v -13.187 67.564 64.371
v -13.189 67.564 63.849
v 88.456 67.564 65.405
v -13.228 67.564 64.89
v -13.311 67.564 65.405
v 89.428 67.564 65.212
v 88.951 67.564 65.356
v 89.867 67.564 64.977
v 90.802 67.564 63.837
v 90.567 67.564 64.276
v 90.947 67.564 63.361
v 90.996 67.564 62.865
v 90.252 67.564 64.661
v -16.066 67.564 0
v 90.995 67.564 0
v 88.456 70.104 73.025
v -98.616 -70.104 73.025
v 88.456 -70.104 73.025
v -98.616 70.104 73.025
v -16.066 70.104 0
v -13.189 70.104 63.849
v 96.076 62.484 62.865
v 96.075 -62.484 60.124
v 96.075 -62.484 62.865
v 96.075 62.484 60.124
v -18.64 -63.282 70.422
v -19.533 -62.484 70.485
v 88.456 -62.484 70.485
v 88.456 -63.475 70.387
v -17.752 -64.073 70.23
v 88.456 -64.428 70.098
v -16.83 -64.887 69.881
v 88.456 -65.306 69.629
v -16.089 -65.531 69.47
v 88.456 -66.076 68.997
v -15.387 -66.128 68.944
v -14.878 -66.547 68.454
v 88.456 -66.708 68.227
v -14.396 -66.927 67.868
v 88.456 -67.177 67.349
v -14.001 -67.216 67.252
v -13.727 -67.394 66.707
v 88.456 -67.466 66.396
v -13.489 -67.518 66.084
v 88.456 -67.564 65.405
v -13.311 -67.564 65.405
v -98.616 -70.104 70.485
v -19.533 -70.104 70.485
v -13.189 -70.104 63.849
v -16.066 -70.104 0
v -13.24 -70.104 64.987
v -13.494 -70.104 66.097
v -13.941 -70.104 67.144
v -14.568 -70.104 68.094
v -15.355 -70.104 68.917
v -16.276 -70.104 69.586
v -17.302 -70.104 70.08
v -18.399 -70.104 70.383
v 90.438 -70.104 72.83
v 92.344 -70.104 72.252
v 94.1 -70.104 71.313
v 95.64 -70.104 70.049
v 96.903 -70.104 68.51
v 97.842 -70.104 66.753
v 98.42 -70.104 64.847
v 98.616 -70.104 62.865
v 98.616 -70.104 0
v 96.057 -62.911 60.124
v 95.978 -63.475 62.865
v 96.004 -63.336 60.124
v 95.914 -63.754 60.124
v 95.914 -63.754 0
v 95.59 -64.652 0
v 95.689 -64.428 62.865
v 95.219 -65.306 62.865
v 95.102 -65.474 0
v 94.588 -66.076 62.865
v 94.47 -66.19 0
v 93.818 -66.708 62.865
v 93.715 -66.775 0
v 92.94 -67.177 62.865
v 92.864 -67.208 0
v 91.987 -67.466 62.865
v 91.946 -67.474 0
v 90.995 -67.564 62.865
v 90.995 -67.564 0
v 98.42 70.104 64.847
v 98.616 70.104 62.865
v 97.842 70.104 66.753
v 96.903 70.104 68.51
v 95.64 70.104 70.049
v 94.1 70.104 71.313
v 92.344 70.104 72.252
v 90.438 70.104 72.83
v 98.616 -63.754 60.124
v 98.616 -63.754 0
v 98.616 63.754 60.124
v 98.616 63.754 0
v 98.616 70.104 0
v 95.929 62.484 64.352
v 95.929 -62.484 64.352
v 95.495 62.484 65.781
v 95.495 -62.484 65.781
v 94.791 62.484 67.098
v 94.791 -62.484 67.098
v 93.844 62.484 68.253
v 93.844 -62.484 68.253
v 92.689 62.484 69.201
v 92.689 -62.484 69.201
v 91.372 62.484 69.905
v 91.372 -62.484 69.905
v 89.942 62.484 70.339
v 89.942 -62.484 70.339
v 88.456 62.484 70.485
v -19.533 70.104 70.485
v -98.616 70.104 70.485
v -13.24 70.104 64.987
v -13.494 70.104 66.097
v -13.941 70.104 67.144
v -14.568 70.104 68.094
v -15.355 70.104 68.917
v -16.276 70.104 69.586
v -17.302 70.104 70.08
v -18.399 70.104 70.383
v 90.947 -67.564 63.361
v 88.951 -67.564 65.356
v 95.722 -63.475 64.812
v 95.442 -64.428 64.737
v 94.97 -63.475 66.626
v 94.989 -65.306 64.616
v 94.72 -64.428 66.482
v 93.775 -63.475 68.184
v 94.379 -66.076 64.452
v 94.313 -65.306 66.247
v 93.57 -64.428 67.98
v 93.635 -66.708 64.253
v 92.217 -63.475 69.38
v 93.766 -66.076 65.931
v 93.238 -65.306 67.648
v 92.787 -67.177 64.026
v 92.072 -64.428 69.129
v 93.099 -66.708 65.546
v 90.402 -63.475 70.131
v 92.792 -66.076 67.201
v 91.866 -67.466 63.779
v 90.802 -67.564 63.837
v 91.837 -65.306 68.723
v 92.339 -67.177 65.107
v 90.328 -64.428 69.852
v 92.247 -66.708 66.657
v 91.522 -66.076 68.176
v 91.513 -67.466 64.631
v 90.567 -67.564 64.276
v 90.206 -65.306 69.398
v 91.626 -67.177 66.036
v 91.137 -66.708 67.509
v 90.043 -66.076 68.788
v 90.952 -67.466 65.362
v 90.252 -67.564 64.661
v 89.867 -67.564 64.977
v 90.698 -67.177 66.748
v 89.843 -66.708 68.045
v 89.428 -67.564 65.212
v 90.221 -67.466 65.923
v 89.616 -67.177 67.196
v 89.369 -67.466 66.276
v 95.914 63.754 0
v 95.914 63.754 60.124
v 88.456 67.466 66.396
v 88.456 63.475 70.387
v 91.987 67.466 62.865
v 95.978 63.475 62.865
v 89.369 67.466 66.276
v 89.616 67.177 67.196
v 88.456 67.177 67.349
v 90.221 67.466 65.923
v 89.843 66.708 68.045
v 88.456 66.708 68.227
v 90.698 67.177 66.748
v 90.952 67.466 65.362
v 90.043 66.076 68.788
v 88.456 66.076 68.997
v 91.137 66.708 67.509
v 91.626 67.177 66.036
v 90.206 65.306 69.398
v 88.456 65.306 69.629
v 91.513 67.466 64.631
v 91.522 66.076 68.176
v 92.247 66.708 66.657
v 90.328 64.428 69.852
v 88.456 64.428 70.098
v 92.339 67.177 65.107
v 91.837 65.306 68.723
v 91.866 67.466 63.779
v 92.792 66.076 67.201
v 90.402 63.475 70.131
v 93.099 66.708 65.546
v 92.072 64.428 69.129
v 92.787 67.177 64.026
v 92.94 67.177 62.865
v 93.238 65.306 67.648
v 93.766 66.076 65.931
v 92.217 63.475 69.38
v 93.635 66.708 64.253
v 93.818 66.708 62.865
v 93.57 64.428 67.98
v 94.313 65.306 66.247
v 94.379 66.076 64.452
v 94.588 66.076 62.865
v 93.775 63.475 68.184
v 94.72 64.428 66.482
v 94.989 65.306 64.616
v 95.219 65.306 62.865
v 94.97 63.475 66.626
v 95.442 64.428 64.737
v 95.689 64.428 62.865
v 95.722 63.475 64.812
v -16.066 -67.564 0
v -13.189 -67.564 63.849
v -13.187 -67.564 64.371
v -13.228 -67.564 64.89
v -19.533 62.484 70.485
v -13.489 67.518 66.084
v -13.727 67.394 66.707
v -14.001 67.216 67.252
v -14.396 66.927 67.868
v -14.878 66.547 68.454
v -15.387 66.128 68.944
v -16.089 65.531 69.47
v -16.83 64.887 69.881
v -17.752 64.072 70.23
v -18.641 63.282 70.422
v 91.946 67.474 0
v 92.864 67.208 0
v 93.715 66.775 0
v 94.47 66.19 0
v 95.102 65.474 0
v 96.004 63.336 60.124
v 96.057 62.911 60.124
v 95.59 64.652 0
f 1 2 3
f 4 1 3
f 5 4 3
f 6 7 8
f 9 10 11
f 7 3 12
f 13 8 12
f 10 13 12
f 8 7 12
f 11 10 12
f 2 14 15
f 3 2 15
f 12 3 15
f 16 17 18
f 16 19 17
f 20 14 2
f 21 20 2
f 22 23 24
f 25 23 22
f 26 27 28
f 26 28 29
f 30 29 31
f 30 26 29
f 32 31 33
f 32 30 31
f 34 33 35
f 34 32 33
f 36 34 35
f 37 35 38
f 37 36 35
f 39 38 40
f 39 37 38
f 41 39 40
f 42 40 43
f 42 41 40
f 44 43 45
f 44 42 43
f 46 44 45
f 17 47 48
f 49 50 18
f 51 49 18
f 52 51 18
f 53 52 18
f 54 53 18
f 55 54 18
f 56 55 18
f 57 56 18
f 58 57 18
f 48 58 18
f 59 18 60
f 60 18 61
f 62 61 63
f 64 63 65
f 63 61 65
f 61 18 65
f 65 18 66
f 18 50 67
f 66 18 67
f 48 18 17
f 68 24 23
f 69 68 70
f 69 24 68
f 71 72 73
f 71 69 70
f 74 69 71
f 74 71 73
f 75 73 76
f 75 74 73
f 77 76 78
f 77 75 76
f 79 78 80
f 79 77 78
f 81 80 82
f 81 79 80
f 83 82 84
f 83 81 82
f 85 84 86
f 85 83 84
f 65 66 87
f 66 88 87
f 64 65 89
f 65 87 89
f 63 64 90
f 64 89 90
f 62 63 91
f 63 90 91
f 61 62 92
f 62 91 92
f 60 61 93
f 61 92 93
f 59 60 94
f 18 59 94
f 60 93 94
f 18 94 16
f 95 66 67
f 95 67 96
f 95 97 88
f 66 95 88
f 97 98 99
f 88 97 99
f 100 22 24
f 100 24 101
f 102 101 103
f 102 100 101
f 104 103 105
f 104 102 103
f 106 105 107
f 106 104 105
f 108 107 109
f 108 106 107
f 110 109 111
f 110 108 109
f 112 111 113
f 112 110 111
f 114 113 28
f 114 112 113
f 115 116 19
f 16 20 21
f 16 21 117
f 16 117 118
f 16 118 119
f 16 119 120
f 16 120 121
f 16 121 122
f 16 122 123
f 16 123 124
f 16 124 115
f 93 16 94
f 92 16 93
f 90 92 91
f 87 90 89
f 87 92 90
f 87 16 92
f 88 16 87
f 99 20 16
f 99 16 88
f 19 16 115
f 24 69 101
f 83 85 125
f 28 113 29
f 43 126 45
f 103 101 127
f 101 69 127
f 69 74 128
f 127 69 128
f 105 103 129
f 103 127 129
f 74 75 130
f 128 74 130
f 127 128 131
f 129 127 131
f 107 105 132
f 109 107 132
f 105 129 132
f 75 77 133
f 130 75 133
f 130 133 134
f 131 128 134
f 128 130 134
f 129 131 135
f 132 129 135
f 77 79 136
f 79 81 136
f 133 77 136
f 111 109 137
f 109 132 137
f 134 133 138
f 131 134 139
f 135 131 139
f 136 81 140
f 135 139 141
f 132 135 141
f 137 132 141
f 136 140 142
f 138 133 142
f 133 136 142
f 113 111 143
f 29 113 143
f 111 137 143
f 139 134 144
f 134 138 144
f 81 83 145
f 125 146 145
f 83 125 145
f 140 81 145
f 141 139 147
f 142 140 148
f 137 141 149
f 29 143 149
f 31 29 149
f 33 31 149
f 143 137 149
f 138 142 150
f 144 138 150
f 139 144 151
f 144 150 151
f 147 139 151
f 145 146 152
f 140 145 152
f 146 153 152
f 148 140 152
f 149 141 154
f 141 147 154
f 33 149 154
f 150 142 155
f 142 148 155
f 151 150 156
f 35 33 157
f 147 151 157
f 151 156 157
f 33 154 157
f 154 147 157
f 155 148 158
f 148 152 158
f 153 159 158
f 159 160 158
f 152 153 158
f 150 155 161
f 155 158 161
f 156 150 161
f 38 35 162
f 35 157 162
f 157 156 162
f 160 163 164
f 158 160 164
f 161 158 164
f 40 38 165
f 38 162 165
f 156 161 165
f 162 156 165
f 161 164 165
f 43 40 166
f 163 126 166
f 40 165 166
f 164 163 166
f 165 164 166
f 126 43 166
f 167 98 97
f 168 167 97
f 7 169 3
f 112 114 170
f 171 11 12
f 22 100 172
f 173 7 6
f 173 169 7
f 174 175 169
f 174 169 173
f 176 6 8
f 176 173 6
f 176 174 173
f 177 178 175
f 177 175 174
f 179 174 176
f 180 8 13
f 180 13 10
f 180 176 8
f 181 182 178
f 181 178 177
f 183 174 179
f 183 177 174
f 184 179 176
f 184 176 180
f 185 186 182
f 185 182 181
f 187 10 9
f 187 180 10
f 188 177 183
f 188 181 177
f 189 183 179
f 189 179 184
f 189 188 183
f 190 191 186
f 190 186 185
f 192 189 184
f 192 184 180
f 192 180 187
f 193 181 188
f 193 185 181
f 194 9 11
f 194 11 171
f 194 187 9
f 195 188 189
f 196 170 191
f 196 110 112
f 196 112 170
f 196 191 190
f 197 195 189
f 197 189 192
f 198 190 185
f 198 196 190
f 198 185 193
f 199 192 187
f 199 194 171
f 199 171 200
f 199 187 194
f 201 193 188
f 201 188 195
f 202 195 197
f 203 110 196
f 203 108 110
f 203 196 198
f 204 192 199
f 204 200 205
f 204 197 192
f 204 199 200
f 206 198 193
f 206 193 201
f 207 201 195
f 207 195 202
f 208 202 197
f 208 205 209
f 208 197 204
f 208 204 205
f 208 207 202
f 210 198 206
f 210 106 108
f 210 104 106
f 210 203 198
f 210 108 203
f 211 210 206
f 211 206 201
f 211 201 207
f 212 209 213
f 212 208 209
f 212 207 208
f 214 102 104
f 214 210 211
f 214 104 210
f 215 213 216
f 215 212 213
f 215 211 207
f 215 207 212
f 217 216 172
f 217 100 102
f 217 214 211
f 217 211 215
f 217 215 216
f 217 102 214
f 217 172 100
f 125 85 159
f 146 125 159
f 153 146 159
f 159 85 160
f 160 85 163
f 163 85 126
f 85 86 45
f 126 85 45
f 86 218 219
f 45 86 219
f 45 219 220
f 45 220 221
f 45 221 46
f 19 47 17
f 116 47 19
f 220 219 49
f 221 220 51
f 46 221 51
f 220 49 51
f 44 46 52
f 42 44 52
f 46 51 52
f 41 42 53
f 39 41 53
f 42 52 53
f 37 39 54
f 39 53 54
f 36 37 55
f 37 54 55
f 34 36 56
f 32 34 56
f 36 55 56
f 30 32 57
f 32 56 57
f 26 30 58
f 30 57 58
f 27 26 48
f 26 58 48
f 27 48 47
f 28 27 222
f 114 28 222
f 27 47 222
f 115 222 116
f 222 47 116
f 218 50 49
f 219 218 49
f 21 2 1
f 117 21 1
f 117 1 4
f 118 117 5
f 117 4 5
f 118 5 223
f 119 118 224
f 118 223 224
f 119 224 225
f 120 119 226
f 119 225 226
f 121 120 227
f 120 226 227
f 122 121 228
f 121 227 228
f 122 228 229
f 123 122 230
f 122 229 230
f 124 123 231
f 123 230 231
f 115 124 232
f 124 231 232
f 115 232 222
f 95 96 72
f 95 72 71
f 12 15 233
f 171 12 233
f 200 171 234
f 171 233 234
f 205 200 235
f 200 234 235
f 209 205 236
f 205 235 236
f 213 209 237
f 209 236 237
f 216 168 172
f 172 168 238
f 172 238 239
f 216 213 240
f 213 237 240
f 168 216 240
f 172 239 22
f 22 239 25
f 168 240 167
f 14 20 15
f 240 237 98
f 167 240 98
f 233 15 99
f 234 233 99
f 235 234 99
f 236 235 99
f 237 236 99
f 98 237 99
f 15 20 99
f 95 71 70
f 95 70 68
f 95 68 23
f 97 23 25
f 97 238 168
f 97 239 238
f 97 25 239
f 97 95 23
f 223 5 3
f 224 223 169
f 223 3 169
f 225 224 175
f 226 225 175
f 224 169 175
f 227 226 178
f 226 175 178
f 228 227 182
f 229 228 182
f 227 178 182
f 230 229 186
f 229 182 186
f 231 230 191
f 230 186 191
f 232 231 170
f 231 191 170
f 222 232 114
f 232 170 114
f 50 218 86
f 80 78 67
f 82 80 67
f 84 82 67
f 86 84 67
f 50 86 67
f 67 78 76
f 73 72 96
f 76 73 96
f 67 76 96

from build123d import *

# Parameters (mm, degrees)
F0_W      = 197.231
F0_H      = 140.208
F1_DEPTH  = 73.025
F2_R      = 10.16
F3_T      = -2.54
F4_W      = 11.0265567622
F4_H      = 70.485
F4_W_2    = 137.668
F5_DEPTH  = 25.4
F6_R      = 5.08
F7_W      = 127.508
F7_H      = 60.1236441541
F8_DEPTH  = 25.4
F10_DEPTH = 254


with BuildPart() as f1:
    # F0 (on Top) → F1 (new body)
    with BuildSketch(Plane.XY):
        Rectangle(F0_W, F0_H)
    extrude(amount=F1_DEPTH)

    # F2
    f2_edges = [f1.edges().sort_by_distance(p)[0] for p in [
        (98.6155, 0, 73.025),
    ]]
    fillet(f2_edges, radius=F2_R)

    # F3
    f3_openings = [f1.faces().sort_by_distance(p)[0] for p in [
        (0, 0, 0),
    ]]
    offset(amount=F3_T, openings=f3_openings)

    # F4 (on face) → F5 (cut)
    with BuildSketch(Plane(origin=(-98.6155, 0, 0), x_dir=(0, -1, 0), z_dir=(-1, 0, 0))):
        with Locations((-75.6172783811, 35.2425)):
            Rectangle(F4_W, F4_H)
        with Locations((-1.27, 35.2425)):
            Rectangle(F4_W_2, F4_H)
    extrude(amount=-F5_DEPTH, mode=Mode.SUBTRACT)

    # F6
    f6_edges = [f1.edges().sort_by_distance(p)[0] for p in [
        (96.0755, -67.564, 31.4325),
        (96.0755, 67.564, 31.4325),
    ]]
    fillet(f6_edges, radius=F6_R)

    # F7 (on face) → F8 (cut)
    with BuildSketch(Plane.YZ.offset(98.6155)):
        with Locations((0, 30.061822077)):
            Rectangle(F7_W, F7_H)
    extrude(amount=-F8_DEPTH, mode=Mode.SUBTRACT)

    # F9 (on face) → F10 (cut)
    with BuildSketch(Plane.XZ.offset(70.104)):
        with BuildLine():
            Line((-98.6155, 70.485), (-98.6155, 0))
            Line((-98.6155, 0), (-16.0655, 0))
            Line((-16.0655, 0), (-13.1894074903, 63.8492537147))
            ThreePointArc((-13.1894074903, 63.8492537147), (-14.9429320556, 68.5229386441), (-19.5329750245, 70.485))
            Line((-19.5329750245, 70.485), (-98.6155, 70.485))
        make_face()
    extrude(amount=-F10_DEPTH, mode=Mode.SUBTRACT)


solid = f1.part
